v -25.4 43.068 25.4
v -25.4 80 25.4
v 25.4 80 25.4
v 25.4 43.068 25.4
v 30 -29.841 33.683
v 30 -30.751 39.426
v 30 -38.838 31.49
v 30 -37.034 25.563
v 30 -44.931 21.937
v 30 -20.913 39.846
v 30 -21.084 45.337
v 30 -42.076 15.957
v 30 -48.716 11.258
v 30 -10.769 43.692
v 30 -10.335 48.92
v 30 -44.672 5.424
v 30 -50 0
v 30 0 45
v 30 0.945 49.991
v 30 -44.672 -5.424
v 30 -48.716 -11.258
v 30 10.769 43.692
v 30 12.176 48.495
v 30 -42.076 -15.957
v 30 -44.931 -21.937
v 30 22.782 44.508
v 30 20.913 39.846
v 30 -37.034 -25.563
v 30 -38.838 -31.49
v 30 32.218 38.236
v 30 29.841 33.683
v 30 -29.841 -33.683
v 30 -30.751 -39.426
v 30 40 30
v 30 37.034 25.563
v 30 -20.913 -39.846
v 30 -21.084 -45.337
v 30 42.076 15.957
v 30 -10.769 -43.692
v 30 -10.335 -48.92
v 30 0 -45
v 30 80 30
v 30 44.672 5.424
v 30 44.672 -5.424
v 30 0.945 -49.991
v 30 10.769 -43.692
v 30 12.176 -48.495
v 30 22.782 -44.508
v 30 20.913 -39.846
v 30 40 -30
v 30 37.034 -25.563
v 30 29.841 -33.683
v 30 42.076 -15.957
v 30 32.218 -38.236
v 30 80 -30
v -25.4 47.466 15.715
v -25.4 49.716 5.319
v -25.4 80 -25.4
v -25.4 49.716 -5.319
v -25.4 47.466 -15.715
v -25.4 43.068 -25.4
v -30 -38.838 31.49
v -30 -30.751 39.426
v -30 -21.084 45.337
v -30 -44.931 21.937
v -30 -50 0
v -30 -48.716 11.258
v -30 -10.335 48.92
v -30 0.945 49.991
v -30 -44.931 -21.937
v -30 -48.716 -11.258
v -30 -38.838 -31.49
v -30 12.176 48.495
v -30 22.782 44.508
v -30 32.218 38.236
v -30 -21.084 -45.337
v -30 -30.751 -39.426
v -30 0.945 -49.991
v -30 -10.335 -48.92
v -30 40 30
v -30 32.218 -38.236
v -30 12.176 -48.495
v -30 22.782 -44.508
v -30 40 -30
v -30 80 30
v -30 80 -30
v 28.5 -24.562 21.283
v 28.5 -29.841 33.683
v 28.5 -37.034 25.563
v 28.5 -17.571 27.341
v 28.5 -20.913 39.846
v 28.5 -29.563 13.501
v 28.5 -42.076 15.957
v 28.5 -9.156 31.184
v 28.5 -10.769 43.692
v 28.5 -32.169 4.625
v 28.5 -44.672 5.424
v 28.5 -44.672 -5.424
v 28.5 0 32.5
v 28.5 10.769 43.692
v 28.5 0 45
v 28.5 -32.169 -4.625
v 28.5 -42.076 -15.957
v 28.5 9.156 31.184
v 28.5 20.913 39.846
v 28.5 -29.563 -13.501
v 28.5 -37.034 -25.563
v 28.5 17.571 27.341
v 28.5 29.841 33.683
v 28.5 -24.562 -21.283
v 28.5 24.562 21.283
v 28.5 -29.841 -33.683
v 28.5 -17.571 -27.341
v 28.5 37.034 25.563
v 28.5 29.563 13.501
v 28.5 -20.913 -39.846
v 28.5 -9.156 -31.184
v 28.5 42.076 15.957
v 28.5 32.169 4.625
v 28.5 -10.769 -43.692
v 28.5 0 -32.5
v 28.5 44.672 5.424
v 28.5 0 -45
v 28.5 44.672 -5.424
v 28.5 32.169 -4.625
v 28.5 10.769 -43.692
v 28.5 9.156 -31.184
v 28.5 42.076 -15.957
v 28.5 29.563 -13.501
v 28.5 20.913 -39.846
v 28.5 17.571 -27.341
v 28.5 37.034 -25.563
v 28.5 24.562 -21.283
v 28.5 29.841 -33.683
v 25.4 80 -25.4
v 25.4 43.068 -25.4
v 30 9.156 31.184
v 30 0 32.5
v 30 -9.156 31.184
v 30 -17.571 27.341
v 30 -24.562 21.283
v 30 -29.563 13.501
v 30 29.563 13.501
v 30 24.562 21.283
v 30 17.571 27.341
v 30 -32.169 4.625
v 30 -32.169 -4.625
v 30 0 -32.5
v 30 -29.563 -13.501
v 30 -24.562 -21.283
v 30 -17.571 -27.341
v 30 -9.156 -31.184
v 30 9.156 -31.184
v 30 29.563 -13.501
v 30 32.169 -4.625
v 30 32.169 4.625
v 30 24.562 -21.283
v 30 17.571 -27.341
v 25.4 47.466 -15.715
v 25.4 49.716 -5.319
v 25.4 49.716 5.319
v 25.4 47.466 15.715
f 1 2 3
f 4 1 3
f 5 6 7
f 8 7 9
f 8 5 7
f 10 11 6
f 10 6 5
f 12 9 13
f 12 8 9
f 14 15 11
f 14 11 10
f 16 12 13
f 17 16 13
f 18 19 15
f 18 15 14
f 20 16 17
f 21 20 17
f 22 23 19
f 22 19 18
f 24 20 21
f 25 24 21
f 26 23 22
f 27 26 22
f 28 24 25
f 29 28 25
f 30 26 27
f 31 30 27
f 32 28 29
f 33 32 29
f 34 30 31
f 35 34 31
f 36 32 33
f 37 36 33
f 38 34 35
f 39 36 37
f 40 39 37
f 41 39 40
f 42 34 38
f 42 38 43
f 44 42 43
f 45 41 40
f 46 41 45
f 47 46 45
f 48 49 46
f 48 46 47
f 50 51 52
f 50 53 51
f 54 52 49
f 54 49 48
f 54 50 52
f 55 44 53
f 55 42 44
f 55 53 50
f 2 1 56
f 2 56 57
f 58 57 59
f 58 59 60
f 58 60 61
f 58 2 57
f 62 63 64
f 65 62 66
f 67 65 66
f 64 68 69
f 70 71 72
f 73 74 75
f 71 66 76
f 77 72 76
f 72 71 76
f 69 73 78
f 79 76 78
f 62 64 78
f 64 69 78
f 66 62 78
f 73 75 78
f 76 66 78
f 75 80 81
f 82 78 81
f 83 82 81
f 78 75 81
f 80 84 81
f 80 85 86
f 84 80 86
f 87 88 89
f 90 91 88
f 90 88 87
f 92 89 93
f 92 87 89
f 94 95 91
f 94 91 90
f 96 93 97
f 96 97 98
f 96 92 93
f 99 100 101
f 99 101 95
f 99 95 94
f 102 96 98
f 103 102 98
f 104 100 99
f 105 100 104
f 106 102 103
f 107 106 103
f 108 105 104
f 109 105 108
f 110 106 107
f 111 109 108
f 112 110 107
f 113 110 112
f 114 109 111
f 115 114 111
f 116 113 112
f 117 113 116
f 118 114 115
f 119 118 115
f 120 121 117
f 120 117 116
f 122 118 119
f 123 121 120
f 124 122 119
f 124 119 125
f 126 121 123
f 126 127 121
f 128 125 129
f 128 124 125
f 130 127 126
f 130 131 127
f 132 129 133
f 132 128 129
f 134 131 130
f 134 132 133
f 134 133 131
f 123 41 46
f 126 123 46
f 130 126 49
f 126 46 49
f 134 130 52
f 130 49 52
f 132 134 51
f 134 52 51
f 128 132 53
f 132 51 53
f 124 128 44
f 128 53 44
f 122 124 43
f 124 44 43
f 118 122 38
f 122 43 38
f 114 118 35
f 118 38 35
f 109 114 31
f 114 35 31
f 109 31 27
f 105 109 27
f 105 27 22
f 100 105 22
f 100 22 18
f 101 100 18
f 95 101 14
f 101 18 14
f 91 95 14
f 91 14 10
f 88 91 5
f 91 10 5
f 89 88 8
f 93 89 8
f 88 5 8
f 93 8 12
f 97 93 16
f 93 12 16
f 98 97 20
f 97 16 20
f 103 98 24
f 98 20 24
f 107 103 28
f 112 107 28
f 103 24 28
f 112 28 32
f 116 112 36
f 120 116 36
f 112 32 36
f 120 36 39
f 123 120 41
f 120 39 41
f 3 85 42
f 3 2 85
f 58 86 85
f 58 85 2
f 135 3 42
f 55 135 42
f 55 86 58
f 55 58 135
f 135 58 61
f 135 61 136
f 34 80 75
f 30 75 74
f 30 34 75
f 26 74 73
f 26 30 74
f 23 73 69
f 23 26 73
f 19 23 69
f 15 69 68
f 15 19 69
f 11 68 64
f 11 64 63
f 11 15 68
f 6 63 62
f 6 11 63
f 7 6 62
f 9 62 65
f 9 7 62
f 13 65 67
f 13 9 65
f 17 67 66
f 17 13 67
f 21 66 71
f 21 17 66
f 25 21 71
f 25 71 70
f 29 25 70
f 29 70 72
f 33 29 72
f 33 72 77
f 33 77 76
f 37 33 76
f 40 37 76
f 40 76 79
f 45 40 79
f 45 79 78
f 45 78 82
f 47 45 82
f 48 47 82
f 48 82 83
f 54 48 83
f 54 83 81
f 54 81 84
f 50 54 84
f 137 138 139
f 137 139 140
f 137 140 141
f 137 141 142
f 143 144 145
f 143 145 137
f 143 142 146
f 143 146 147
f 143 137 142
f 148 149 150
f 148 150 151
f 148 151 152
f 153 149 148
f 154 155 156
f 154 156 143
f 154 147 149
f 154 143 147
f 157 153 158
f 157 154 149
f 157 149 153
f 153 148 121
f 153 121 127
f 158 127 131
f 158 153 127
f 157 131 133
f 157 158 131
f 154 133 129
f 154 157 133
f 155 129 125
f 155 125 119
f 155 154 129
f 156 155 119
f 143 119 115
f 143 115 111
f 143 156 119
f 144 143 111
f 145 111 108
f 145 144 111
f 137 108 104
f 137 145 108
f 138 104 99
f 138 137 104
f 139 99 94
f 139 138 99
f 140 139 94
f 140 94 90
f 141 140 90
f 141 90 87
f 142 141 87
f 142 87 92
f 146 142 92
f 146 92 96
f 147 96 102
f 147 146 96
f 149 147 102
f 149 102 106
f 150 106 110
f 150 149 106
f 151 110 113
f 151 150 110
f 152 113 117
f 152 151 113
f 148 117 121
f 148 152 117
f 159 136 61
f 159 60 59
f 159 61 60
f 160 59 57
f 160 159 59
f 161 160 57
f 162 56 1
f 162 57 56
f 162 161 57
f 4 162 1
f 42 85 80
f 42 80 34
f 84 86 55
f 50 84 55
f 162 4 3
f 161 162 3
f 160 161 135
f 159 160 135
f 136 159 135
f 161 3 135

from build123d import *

# Parameters (mm, degrees)
CROQUIS1_R                   = 50
SALIENTE_EXTRUIR1_DEPTH      = 30
SALIENTE_EXTRUIR2_REACH      = 144.478
SALIENTE_EXTRUIR2_END_RADIUS = 50
CROQUIS3_W                   = 60
CROQUIS3_H                   = 60
CROQUIS3_W_2                 = 50.8
CROQUIS3_H_2                 = 50.8
CROQUIS4_R                   = 45
CROQUIS4_R_2                 = 32.5
CORTAR_EXTRUIR1_DEPTH        = 1.5


with BuildPart() as part:
    # Croquis1 → Saliente-Extruir1 (new, symmetric)
    with BuildSketch(Plane(origin=(0, 0, 0), x_dir=(0, 0, -1), z_dir=(1, 0, 0))):
        Circle(CROQUIS1_R)
    extrude(amount=SALIENTE_EXTRUIR1_DEPTH, both=True)

    # Saliente-Extruir2: up to this cylinder (the profile starts outside it)
    saliente_extruir2_end = Plane(origin=(0, 0, 0), z_dir=(-1, 0, 0)) * Cylinder(SALIENTE_EXTRUIR2_END_RADIUS, 389.956, mode=Mode.PRIVATE)
    # Croquis3 → Saliente-Extruir2 (add, up to the surface)
    with BuildSketch(Plane(origin=(0, 80, 0), x_dir=(1, 0, 0), z_dir=(0, 1, 0)), mode=Mode.PRIVATE) as saliente_extruir2_sk1:
        Rectangle(CROQUIS3_W, CROQUIS3_H)
        Rectangle(CROQUIS3_W_2, CROQUIS3_H_2, mode=Mode.SUBTRACT)
    saliente_extruir2_tool1 = extrude(saliente_extruir2_sk1.sketch, amount=-SALIENTE_EXTRUIR2_REACH, mode=Mode.PRIVATE) - saliente_extruir2_end
    add(saliente_extruir2_tool1.solids().sort_by_distance((0, 80, 29.151472))[0])

    # Croquis4 → Cortar-Extruir1 (cut)
    with BuildSketch(Plane(origin=(30, 0, 0), x_dir=(0, 0, -1), z_dir=(1, 0, 0))):
        Circle(CROQUIS4_R)
        Circle(CROQUIS4_R_2, mode=Mode.SUBTRACT)
    extrude(amount=-CORTAR_EXTRUIR1_DEPTH, mode=Mode.SUBTRACT)


solid = part.part
